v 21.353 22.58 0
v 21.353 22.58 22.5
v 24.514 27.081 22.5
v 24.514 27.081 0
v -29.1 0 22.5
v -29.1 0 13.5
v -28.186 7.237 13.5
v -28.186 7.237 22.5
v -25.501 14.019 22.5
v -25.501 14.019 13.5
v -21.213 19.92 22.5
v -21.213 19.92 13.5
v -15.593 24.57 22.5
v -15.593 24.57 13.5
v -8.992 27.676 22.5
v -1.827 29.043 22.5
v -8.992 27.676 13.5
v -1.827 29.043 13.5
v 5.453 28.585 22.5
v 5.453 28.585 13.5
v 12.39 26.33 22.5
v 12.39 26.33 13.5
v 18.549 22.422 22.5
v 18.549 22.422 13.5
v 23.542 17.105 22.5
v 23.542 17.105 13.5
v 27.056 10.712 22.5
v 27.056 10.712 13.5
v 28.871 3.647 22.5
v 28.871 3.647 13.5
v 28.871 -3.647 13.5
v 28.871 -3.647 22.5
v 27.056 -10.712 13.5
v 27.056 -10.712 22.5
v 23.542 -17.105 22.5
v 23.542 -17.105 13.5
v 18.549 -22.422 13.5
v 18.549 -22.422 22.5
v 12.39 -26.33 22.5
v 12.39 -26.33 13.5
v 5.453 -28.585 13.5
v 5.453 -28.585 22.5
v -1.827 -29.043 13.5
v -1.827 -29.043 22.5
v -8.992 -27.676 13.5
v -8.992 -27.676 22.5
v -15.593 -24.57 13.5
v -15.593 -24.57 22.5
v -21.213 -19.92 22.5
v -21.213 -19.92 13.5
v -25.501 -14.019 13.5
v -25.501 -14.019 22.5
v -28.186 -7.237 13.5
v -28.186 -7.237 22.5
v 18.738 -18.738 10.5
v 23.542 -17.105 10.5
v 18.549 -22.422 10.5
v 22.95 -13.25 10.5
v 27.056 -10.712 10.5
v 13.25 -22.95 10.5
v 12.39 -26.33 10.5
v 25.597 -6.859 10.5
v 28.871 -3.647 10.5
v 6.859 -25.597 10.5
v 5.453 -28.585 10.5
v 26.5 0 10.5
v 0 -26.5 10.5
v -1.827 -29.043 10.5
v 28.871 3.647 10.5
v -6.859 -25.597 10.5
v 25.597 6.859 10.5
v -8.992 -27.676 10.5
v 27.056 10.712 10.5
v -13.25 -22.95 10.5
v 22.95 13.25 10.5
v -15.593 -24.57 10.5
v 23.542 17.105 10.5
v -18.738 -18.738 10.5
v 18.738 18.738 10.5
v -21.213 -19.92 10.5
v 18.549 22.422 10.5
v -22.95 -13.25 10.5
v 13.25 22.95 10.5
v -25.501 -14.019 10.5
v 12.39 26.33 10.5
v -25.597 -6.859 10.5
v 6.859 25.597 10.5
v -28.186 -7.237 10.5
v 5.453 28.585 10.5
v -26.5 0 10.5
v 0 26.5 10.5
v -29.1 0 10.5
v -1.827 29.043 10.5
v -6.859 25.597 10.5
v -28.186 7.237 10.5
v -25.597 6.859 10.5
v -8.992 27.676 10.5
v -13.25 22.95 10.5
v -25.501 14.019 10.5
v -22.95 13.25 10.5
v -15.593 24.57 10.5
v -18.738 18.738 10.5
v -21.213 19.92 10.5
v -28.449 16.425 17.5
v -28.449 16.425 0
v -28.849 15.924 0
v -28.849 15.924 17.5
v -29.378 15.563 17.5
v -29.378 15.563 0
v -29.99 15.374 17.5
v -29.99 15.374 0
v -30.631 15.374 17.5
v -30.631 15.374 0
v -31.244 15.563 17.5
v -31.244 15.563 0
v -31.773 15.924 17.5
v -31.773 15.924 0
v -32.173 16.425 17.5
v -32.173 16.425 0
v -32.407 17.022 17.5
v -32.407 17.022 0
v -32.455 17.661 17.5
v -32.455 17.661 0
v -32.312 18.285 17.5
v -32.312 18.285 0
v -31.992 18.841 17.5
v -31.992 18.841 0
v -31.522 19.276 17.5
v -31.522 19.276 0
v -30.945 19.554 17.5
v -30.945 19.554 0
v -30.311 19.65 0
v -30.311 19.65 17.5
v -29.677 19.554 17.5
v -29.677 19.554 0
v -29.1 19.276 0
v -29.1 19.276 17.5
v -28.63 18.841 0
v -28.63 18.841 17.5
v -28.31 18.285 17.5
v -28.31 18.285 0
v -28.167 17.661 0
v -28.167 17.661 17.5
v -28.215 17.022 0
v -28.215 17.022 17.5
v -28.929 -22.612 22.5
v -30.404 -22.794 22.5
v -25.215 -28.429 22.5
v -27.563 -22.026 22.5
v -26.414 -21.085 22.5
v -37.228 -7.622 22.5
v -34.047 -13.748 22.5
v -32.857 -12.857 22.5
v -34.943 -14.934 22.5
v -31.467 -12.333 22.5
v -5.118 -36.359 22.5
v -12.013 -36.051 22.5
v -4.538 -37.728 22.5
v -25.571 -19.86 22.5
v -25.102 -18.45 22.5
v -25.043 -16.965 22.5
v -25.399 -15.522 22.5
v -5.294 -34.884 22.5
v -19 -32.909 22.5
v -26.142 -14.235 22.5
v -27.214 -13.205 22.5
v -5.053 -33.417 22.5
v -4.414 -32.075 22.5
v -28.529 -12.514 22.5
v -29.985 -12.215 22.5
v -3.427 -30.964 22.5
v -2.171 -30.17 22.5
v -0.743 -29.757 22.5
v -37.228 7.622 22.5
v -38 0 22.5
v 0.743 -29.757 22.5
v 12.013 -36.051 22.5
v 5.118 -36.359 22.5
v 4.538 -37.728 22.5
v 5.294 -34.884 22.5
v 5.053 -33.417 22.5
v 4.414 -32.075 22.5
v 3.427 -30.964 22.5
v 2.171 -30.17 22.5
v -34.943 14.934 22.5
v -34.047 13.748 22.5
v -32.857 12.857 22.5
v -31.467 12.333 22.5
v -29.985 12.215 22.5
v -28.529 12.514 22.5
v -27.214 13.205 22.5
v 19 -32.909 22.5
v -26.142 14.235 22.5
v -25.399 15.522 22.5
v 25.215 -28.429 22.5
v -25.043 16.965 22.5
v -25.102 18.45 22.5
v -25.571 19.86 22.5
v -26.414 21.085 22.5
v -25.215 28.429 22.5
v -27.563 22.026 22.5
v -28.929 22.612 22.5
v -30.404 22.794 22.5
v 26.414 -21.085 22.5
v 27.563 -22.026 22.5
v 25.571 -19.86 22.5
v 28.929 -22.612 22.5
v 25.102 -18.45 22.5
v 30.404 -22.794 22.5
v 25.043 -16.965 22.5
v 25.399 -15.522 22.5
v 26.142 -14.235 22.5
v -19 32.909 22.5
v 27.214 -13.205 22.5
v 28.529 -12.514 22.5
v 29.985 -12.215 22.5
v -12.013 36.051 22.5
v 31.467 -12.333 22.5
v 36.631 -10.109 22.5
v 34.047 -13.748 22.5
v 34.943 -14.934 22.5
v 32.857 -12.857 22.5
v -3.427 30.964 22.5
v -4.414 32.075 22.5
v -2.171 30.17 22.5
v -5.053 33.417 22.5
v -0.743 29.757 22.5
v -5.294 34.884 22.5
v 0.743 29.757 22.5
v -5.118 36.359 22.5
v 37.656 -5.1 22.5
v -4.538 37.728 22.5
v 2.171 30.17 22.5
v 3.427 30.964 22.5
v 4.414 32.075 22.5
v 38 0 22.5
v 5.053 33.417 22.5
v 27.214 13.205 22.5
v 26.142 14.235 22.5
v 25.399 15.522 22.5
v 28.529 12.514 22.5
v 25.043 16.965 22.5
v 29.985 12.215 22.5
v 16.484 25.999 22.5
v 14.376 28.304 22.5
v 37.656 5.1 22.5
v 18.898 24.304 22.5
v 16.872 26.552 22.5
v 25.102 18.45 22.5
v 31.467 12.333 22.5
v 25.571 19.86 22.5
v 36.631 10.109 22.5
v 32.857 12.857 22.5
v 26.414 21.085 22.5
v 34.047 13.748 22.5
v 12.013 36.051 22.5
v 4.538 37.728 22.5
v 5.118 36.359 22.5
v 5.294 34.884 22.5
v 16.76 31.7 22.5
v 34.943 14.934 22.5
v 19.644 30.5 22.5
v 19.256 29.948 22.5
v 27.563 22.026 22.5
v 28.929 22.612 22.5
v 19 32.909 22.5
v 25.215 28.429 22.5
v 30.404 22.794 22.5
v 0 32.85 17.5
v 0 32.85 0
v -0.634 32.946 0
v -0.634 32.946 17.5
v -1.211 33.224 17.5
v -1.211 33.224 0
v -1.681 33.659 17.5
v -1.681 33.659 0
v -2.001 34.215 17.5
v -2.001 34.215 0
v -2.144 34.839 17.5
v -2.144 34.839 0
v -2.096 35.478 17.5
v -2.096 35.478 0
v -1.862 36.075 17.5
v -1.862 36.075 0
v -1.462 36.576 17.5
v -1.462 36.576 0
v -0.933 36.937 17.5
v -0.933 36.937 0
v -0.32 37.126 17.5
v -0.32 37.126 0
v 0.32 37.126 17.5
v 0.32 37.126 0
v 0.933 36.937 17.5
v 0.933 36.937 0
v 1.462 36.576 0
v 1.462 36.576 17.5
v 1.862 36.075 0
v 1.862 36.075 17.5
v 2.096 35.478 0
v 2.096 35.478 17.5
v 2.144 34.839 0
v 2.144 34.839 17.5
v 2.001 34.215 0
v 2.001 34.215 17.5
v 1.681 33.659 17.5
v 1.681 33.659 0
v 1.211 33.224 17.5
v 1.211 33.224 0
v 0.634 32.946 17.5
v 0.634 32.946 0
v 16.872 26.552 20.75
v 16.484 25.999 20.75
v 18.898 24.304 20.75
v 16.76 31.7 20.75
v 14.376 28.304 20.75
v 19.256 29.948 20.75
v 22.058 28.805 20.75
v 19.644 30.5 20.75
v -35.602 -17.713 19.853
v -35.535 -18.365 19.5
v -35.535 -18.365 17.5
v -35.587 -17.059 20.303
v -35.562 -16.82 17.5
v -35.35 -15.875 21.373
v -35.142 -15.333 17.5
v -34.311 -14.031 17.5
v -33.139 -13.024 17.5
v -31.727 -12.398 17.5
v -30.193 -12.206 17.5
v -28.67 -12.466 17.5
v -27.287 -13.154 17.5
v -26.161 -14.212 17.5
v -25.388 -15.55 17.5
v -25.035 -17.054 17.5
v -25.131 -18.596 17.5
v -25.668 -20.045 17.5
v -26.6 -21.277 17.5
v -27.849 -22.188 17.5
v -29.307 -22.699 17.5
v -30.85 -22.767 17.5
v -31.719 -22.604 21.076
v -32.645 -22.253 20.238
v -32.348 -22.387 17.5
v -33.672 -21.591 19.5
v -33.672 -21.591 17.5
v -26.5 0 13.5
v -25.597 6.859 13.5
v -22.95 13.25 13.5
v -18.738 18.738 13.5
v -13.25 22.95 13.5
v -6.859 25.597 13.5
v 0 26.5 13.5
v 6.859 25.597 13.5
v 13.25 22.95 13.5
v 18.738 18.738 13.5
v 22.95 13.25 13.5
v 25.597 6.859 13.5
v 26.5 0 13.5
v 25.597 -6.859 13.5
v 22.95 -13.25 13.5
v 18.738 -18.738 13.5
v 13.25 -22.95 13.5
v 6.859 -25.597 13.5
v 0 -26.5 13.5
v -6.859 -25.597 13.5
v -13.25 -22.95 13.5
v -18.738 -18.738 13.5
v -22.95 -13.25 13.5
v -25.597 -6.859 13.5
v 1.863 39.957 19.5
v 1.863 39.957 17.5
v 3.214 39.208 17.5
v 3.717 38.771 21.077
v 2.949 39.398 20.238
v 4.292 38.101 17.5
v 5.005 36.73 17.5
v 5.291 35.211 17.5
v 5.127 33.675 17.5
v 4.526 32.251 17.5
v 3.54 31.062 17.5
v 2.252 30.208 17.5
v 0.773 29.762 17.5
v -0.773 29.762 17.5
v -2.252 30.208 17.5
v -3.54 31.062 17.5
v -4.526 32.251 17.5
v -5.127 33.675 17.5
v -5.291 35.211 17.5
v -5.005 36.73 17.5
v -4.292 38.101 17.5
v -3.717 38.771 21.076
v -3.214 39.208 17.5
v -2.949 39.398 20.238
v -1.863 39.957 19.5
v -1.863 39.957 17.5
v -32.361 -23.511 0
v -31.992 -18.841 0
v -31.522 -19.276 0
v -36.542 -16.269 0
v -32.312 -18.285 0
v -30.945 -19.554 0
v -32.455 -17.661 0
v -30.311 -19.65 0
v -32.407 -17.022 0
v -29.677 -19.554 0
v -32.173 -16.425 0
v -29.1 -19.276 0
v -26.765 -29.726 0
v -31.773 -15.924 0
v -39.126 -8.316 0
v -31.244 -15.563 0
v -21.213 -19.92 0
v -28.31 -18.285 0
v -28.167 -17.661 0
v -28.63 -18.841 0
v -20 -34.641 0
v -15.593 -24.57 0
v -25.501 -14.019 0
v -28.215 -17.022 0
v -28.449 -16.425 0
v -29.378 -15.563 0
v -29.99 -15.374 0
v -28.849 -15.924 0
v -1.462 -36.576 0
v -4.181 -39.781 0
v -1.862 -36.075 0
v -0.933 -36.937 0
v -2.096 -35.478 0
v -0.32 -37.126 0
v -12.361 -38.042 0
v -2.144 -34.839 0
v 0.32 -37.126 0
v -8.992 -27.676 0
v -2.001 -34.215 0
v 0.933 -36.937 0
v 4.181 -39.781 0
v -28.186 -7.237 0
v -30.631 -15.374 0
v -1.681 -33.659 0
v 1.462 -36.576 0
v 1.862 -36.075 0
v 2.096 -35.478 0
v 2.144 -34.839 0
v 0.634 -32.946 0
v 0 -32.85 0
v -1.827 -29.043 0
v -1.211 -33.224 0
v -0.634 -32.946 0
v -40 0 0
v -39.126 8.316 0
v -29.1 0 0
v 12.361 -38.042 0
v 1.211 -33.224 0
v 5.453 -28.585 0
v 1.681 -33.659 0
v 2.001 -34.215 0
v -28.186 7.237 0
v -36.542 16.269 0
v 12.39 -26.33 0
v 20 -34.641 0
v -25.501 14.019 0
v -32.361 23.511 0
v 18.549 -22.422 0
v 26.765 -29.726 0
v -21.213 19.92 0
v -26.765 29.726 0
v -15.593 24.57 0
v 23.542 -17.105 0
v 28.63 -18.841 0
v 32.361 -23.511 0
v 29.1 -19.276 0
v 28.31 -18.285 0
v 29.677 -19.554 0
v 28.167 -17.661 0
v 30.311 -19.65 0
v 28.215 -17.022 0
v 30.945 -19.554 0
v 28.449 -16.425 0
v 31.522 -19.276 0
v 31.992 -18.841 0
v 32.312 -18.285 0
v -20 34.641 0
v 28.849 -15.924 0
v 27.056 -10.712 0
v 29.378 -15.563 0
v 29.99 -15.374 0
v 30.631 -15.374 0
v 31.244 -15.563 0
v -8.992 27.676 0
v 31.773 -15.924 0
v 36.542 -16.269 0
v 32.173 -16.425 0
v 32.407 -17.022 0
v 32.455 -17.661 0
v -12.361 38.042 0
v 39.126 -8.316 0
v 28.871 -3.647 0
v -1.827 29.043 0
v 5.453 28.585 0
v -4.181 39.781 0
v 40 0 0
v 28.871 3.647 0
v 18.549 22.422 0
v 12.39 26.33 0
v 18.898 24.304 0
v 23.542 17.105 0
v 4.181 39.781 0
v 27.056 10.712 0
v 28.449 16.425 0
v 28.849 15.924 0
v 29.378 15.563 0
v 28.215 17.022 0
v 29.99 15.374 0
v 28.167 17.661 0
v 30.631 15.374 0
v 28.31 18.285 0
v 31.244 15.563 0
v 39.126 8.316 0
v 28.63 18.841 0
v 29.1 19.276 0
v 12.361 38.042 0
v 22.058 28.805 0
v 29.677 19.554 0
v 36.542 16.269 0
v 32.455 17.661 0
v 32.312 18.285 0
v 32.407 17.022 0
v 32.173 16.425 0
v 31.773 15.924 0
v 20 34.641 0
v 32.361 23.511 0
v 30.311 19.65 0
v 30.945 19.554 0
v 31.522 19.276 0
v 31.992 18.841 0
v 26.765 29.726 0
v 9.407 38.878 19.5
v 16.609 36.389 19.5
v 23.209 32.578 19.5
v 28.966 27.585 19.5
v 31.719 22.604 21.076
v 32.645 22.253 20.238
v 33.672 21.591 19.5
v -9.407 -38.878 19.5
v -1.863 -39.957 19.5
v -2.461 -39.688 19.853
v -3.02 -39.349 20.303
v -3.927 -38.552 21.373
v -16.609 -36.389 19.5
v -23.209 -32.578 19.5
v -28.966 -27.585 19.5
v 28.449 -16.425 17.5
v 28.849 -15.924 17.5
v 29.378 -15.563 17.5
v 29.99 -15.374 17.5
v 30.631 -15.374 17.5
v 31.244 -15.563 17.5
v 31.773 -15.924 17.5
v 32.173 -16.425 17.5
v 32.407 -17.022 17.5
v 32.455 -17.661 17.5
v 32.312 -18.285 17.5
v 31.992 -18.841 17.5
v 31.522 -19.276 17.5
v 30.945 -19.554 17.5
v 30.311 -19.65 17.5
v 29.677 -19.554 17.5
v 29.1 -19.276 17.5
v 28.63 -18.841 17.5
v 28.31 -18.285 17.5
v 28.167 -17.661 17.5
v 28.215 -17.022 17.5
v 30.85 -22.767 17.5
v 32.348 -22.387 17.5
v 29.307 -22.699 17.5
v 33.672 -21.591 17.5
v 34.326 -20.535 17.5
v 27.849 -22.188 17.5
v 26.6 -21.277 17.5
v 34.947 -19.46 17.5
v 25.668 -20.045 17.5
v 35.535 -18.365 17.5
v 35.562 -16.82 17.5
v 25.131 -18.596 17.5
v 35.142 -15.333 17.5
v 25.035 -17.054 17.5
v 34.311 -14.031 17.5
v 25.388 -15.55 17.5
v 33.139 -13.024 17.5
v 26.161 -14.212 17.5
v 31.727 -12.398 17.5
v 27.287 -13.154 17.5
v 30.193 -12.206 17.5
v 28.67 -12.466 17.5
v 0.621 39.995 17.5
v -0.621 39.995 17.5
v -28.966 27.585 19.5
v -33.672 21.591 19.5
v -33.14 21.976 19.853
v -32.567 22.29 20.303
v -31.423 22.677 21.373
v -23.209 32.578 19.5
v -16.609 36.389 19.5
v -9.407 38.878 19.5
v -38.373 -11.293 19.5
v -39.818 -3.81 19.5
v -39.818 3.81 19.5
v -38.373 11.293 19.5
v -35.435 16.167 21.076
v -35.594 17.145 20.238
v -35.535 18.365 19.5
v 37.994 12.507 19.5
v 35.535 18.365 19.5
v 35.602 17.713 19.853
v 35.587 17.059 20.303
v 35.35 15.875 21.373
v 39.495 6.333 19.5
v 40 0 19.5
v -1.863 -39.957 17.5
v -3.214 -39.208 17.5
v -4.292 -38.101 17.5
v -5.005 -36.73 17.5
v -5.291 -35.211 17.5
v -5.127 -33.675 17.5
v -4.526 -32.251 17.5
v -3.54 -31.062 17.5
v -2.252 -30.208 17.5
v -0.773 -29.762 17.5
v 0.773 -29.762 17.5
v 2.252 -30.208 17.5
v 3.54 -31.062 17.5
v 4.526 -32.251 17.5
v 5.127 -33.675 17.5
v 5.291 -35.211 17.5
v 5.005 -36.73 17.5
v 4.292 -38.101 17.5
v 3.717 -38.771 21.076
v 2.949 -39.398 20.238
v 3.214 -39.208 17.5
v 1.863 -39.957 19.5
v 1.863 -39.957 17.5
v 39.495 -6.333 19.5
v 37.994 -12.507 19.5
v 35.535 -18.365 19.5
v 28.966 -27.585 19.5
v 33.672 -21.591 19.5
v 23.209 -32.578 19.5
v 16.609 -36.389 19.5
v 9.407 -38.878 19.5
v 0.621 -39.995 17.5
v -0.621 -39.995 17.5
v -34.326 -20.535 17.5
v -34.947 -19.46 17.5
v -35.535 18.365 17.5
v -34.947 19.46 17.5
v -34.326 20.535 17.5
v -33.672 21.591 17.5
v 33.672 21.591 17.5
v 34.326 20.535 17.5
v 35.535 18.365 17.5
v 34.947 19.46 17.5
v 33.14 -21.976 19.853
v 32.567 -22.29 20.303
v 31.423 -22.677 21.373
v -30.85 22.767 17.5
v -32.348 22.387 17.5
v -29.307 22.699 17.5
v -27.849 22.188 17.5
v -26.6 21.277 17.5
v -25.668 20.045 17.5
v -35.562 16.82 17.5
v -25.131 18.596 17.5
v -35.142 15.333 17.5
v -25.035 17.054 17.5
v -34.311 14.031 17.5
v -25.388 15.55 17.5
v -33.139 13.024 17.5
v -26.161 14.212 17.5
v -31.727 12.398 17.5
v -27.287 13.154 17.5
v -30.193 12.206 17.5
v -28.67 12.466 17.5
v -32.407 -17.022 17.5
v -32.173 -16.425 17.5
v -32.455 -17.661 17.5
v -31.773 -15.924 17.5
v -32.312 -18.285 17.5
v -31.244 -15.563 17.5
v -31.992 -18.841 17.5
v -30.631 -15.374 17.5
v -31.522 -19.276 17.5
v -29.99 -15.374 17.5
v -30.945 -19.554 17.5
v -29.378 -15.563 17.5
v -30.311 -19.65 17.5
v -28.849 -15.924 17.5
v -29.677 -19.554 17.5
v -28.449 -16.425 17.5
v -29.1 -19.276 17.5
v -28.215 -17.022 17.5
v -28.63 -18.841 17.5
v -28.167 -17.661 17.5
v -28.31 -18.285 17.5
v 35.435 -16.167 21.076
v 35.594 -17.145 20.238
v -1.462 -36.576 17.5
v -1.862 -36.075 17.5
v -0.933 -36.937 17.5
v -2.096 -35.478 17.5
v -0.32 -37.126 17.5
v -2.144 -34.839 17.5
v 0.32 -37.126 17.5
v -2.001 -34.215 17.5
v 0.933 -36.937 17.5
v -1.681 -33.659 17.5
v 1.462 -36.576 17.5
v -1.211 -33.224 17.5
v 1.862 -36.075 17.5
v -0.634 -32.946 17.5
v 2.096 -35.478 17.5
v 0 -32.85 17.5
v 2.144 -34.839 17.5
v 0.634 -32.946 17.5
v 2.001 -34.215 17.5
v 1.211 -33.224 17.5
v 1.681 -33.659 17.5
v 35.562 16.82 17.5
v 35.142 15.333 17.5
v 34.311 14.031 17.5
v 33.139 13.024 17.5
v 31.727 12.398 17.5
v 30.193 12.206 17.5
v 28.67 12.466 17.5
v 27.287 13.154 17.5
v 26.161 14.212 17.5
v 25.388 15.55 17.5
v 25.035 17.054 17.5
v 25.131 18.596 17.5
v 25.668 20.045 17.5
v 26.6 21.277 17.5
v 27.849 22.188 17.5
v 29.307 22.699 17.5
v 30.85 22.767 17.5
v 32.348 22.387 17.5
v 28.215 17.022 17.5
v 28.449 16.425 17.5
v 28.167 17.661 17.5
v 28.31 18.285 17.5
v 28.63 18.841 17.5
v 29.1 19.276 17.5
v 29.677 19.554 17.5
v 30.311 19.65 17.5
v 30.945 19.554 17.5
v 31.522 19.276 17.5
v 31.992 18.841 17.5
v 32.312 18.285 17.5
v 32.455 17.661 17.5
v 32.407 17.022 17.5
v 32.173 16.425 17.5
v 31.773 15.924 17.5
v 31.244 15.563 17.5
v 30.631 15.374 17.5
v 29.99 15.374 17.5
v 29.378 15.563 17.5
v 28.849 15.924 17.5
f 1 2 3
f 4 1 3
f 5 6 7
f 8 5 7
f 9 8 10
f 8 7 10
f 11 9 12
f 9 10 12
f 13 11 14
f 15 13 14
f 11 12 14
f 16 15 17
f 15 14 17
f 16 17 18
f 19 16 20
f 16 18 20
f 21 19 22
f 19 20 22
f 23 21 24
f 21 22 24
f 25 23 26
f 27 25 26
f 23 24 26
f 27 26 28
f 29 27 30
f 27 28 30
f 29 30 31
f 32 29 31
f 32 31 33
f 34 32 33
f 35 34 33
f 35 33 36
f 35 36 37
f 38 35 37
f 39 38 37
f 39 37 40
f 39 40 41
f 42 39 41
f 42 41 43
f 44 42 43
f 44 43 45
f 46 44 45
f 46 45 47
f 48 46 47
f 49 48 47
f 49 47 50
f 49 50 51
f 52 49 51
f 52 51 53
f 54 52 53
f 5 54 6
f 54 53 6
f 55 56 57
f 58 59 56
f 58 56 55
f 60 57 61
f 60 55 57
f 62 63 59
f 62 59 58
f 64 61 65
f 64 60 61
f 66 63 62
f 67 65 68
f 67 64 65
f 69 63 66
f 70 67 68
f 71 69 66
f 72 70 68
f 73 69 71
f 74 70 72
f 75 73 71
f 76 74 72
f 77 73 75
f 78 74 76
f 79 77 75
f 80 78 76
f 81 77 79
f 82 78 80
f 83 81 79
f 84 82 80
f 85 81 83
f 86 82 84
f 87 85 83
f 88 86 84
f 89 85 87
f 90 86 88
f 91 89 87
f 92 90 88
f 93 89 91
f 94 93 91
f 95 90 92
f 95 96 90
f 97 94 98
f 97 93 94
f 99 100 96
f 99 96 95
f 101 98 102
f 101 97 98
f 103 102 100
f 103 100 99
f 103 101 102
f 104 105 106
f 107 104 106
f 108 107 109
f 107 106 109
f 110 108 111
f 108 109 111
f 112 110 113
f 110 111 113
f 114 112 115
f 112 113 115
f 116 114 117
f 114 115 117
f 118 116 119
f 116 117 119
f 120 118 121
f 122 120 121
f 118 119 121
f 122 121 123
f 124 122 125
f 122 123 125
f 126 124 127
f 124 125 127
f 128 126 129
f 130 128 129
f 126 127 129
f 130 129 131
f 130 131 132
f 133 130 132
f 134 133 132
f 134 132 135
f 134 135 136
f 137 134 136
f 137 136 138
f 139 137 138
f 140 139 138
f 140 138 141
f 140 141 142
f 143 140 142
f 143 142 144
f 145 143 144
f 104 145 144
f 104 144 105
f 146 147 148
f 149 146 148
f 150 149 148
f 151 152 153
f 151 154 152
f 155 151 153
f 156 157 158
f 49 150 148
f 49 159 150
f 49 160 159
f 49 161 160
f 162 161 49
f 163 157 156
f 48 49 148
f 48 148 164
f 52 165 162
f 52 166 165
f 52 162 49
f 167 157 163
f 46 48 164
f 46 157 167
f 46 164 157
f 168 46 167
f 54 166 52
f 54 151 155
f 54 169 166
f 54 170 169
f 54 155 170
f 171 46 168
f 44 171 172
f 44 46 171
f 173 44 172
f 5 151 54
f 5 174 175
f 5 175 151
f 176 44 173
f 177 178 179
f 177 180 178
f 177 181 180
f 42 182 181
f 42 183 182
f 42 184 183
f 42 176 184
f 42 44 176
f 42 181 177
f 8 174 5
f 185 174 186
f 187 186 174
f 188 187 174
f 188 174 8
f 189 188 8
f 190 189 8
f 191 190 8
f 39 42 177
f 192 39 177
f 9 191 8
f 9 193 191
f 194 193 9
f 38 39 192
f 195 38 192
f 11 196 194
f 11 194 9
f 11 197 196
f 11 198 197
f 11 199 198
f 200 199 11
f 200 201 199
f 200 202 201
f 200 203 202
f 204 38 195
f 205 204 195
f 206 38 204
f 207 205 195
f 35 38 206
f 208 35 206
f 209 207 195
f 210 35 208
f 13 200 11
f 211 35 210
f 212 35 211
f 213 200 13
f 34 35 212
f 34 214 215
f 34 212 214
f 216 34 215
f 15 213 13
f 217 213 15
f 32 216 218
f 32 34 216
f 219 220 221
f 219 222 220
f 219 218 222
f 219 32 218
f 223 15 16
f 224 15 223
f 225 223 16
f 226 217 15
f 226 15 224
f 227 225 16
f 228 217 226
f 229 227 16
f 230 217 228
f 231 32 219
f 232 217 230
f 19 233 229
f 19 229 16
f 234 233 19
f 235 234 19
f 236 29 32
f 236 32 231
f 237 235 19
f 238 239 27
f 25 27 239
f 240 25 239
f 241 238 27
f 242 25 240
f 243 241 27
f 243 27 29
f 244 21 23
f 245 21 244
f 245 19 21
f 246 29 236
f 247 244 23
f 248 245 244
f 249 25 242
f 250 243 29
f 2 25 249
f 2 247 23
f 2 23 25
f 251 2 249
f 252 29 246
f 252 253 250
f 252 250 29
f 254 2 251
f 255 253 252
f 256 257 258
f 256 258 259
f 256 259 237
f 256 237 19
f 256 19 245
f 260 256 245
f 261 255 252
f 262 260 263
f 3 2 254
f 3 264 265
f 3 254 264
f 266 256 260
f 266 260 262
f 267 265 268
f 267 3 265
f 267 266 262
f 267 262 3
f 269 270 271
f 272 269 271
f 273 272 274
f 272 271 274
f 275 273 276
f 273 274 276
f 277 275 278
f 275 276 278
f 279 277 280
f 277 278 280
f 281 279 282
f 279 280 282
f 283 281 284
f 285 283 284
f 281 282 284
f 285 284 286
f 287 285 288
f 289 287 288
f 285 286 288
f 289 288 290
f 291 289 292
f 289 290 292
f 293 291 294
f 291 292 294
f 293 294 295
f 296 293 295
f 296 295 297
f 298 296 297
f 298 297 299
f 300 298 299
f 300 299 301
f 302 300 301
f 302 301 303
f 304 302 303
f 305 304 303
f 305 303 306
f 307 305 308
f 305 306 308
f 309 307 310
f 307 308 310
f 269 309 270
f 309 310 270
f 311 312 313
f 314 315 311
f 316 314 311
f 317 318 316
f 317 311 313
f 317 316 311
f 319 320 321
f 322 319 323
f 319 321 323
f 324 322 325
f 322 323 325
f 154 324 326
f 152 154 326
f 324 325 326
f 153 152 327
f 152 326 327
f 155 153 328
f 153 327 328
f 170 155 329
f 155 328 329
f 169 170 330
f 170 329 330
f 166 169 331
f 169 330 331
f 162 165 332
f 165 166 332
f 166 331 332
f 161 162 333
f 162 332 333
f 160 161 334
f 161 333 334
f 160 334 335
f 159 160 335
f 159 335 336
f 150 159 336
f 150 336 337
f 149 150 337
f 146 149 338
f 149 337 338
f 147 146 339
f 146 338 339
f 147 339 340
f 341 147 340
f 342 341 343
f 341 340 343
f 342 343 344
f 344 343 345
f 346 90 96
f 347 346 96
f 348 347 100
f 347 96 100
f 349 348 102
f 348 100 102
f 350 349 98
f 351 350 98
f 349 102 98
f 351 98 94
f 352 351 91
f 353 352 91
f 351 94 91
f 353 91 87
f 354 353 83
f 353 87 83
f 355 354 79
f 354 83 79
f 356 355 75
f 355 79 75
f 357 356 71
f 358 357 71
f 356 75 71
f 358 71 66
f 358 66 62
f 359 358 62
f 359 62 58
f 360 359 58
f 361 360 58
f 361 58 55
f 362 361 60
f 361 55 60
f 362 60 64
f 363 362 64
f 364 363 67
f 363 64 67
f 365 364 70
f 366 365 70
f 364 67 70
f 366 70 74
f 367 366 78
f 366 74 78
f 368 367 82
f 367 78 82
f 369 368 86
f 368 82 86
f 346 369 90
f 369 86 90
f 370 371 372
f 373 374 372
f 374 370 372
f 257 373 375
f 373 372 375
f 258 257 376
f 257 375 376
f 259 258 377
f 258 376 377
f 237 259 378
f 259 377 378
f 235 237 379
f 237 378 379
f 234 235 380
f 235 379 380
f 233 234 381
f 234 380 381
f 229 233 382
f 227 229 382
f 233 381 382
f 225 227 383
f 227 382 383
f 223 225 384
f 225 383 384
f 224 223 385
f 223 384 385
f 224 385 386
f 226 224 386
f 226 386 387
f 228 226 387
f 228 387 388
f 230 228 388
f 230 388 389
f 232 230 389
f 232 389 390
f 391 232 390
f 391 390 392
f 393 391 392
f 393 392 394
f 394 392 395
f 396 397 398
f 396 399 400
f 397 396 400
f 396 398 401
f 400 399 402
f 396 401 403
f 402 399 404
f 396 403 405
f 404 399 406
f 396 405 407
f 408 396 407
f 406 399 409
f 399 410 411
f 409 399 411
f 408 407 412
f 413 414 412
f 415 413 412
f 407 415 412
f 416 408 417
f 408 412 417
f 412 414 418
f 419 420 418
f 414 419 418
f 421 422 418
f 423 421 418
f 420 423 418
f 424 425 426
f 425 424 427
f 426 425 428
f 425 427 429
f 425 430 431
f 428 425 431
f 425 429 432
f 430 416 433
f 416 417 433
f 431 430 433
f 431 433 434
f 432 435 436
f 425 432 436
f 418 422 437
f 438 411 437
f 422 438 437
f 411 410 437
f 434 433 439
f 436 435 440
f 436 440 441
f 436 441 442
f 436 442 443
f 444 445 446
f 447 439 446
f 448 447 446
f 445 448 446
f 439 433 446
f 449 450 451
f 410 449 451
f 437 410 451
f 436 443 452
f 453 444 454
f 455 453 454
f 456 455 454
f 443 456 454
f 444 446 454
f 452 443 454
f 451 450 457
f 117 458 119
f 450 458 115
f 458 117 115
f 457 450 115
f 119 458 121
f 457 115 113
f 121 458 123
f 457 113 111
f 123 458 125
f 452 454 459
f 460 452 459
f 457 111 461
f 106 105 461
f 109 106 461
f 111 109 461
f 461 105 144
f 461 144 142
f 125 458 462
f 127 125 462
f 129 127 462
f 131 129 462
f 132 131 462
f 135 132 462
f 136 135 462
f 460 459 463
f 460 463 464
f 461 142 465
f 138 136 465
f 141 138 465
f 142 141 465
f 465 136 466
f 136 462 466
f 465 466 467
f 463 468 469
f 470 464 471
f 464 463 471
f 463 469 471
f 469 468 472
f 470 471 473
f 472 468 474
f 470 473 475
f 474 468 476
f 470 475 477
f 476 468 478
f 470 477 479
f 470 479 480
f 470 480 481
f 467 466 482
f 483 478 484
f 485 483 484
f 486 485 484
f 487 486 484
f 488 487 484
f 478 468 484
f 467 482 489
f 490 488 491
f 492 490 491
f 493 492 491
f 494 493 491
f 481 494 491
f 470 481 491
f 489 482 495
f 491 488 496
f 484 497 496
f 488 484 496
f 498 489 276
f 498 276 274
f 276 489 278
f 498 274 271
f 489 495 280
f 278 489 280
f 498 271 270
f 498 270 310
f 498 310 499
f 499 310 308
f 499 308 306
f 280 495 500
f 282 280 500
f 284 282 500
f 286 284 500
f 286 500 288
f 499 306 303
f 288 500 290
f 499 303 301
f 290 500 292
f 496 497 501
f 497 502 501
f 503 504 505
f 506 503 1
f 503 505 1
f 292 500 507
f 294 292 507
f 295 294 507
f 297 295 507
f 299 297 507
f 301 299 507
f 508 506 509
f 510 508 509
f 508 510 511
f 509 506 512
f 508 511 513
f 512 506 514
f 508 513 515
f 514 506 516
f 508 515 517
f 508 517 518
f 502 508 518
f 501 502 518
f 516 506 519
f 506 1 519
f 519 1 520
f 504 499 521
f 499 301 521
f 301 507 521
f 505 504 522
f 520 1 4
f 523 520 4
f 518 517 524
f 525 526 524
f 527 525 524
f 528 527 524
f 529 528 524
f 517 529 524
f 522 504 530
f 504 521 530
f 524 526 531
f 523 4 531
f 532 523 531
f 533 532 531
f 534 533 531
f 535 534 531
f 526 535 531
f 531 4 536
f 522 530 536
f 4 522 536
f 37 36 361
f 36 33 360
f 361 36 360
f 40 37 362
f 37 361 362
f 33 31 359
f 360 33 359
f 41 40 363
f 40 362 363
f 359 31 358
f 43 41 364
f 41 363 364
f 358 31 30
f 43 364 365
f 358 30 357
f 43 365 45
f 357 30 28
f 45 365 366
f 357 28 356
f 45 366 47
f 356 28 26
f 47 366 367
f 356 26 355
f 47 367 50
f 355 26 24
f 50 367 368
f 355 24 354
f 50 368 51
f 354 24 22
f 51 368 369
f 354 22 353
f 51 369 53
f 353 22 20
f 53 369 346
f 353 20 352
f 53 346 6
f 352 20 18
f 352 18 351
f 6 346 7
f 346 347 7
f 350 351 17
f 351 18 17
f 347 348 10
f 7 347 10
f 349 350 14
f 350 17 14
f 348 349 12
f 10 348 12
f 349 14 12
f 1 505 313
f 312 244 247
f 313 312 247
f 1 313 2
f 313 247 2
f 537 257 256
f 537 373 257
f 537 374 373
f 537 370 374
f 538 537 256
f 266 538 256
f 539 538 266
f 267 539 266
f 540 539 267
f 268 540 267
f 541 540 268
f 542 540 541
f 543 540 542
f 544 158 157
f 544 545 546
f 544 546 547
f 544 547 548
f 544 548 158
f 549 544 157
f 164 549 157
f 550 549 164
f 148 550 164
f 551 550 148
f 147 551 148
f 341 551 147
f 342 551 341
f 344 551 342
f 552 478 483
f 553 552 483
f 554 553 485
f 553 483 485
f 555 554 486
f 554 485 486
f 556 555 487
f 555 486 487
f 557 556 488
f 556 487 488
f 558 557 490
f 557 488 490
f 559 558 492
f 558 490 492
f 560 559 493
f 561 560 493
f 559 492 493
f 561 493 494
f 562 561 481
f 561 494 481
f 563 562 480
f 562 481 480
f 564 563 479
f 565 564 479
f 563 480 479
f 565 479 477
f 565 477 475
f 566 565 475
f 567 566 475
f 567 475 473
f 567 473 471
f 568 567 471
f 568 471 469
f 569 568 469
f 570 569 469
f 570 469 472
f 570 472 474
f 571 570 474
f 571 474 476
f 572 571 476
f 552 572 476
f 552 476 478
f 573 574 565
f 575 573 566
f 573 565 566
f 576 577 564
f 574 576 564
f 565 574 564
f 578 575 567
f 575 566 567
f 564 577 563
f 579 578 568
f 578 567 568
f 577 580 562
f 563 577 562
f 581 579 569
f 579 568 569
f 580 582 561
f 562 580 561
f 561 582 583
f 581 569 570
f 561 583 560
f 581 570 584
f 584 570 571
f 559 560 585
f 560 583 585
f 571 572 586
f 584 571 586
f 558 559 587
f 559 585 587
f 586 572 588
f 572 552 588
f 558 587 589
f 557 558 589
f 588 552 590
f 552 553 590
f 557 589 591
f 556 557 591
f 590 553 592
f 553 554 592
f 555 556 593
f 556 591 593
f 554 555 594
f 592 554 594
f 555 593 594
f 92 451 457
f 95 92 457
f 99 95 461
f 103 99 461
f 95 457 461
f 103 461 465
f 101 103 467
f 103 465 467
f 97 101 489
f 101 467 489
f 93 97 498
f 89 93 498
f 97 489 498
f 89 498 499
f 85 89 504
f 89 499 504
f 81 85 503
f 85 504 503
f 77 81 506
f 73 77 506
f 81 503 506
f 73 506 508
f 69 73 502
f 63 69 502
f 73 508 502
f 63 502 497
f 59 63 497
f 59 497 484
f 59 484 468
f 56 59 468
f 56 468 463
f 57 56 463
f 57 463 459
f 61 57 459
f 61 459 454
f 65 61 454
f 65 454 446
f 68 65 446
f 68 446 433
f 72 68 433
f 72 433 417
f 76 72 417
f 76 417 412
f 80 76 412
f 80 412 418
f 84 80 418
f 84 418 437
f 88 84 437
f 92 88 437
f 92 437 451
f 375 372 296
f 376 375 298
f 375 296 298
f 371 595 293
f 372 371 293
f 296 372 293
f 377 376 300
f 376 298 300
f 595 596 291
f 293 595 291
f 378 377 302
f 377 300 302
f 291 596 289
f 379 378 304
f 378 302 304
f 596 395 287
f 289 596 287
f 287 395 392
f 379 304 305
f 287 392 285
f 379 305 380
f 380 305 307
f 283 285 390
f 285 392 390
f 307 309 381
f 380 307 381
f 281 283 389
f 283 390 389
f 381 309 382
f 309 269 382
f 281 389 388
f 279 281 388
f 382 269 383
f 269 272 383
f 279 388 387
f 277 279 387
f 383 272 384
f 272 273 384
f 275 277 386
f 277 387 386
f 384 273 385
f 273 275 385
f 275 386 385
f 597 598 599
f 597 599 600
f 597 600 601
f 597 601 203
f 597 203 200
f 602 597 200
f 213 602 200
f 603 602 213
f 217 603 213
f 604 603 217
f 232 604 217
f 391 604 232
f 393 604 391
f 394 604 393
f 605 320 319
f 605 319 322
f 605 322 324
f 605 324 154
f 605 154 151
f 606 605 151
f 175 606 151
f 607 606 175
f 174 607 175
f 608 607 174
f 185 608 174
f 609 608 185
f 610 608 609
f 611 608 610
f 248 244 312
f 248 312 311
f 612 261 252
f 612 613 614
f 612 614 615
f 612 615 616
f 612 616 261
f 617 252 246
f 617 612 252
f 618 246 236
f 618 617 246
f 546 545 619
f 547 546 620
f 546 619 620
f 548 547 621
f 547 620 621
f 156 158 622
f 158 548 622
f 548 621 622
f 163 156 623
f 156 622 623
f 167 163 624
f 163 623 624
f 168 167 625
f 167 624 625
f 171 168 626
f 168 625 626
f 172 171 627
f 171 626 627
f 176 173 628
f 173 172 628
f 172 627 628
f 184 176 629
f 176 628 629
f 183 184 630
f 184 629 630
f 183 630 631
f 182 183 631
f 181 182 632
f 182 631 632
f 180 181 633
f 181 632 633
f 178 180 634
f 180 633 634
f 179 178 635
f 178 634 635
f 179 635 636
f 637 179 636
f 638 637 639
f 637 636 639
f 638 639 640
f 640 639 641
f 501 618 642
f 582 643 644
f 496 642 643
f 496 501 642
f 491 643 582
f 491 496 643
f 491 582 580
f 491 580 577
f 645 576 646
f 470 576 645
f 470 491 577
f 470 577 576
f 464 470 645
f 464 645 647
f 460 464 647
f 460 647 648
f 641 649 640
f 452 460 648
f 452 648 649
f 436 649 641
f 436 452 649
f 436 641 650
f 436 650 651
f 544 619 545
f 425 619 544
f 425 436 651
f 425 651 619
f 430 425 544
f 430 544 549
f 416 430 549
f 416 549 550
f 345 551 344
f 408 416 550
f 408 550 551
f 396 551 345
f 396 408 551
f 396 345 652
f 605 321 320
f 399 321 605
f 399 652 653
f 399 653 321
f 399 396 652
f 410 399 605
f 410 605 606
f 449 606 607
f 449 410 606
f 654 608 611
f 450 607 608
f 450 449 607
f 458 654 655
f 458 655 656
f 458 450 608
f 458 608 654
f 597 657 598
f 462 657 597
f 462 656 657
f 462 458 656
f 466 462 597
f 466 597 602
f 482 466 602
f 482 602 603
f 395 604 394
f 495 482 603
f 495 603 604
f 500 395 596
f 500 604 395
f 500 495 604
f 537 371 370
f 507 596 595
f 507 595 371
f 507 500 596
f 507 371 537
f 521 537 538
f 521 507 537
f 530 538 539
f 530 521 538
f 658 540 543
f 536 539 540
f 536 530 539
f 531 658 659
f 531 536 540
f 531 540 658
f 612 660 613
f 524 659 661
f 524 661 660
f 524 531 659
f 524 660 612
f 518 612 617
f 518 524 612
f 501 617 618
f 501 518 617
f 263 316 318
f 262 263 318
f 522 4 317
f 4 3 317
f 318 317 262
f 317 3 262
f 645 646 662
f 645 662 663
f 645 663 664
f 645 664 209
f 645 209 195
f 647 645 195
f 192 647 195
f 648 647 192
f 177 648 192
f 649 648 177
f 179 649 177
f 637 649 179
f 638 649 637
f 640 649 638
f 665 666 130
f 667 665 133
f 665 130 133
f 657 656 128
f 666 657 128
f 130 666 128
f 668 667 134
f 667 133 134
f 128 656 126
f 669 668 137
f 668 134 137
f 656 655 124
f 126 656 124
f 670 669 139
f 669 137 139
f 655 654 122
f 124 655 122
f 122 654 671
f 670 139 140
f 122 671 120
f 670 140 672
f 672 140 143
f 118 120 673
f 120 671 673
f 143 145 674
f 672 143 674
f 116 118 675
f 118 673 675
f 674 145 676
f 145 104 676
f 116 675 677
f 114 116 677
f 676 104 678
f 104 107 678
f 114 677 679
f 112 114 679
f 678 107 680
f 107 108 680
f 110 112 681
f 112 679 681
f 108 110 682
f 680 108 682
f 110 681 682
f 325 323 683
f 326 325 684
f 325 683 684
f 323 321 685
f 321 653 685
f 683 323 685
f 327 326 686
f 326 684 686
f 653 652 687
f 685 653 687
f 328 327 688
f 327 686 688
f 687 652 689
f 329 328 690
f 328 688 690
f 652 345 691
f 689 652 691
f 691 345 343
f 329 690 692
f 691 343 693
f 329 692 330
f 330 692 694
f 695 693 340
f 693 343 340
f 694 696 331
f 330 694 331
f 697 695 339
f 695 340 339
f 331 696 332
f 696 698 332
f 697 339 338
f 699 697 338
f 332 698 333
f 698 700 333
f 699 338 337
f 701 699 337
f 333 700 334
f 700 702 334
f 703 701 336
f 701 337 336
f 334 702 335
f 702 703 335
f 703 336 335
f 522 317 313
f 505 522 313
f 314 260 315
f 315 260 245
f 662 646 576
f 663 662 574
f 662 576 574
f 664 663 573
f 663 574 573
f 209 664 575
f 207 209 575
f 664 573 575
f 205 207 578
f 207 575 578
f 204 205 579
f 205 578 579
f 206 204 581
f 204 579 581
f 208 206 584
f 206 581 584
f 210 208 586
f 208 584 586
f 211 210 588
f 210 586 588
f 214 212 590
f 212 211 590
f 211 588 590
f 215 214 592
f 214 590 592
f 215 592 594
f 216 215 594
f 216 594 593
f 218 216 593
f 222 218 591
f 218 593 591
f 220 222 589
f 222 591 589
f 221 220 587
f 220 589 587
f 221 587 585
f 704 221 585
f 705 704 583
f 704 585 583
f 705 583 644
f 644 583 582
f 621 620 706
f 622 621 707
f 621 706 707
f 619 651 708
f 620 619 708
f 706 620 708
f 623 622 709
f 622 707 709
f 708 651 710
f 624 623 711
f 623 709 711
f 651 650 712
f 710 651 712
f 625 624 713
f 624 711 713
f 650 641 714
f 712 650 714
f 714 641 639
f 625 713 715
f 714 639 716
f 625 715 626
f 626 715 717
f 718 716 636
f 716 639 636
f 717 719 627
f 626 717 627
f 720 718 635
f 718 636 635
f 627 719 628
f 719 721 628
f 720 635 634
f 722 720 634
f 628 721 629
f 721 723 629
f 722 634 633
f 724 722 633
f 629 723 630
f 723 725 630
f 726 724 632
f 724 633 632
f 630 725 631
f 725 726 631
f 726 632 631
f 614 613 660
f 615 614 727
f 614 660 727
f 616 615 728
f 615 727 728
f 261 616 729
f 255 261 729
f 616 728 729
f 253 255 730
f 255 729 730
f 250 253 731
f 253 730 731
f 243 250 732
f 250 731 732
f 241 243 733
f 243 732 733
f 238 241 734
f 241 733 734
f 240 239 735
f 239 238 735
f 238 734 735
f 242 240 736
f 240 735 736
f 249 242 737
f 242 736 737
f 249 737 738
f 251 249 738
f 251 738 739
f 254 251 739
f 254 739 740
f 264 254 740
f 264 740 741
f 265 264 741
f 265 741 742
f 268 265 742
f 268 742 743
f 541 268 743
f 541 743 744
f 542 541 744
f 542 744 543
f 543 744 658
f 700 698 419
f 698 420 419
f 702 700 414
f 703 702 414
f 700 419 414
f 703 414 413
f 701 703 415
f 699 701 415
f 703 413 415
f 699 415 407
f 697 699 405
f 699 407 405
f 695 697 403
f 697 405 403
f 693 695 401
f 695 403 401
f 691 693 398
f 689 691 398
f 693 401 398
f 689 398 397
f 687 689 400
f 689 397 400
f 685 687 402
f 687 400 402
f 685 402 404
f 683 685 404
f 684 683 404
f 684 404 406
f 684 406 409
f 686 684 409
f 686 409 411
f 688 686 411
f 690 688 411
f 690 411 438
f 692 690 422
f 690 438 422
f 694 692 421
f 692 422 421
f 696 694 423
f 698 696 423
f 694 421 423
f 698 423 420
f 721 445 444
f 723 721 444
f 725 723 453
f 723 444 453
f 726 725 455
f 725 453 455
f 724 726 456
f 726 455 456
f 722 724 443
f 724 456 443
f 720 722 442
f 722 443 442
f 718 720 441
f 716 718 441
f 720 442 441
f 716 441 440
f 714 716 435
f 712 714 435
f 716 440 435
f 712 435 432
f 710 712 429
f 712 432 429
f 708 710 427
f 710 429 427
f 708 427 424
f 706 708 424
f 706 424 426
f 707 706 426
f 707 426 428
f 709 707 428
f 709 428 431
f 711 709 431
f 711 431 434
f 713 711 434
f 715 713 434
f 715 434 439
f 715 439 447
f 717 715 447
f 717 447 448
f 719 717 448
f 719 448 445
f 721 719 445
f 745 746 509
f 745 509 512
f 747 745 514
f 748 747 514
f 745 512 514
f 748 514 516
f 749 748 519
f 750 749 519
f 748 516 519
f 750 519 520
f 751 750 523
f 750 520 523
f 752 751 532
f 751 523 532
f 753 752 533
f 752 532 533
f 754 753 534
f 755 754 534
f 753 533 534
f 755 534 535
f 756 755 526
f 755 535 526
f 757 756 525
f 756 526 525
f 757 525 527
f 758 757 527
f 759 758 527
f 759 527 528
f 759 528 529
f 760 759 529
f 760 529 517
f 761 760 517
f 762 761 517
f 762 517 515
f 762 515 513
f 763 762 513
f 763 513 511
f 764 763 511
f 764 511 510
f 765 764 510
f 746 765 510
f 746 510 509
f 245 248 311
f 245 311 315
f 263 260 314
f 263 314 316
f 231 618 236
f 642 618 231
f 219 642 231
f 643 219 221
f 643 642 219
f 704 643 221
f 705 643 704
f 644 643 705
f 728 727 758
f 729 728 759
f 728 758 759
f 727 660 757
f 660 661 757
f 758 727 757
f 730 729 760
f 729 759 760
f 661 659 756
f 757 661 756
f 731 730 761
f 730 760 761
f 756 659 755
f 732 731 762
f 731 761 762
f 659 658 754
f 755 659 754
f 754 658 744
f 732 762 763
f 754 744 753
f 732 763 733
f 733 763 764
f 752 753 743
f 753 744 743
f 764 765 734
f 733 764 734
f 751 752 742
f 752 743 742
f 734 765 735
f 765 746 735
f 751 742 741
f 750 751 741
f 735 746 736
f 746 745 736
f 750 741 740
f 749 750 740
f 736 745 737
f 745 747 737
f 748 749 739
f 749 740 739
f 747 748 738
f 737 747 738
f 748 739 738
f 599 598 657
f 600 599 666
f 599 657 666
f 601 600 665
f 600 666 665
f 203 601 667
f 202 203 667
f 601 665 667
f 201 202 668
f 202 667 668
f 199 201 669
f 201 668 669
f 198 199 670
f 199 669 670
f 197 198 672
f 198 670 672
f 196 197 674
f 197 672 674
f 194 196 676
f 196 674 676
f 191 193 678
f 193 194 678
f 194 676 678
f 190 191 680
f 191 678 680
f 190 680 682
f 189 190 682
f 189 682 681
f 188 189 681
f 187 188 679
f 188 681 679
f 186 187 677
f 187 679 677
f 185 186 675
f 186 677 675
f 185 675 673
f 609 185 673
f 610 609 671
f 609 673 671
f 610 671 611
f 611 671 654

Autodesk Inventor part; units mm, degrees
ref_plane "YZ Plane" through (0, 0, 0) normal (1, 0, 0) x (0, 1, 0)
ref_plane "XZ Plane" through (0, 0, 0) normal (0, 1, 0) x (-1, 0, 0)
ref_plane "XY Plane" through (0, 0, 0) normal (0, 0, 1) x (1, 0, 0)
sketch "Sketch1" plane through (0, 0, 0) normal (0, 0, 1) x (1, 0, 0)
  circle A0 centre (0, 0) radius 40
  dimension "d0" = 80
extrude "Extrusion1" add sketch "Sketch1" along normal blind 22.5
sketch "Sketch2" plane through (0, 0, 22.5) normal (0, 0, 1) x (1, 0, 0)
  point P0 (0, 0)
  point P1 (0, 35)
  dimension "d3" = 35
hole "Hole1" at (0, 35, 22.5) direction (0, 0, -1) diameter 4.3 end through all counterbore diameter 10.59 counterbore depth 5 clearance for "Hex Head Machine Screw" size "M4" standard "Ansi Metric M Profile"
chamfer "Chamfer1" distance 2 distance2 3 2 edges at (-27.6179, -28.9353, 22.5) (28.9353, 27.6179, 22.5) measured on face at (-2.7418, -16.4668, 22.5)
pattern_circular "Circular Pattern1" count 6 over 360 about axis through (0, 0, 0) along (0, 0, 1) of "Hole1"
sketch "Sketch3" plane through (0, 0, 0) normal (0, 0, -1) x (-1, 0, 0)
  circle A0 centre (0, 0) radius 29.1
  dimension "d17" = 58.2
extrude "Extrusion2" cut sketch "Sketch3" against normal through all
ref_plane "Work Plane1" through (0, 0, 10.5) normal (0, 0, -1) x (-1, 0, 0)
sketch "Sketch4" plane through (0, 0, 10.5) normal (0, 0, -1) x (-1, 0, 0)
  circle A0 centre (0, 0) radius 29.5
  circle A1 centre (0, 0) radius 26.5
  dimension "d21" = 53
  dimension "d22" = 59
extrude "Extrusion3" add sketch "Sketch4" against normal blind 3
sketch "Sketch5" plane through (0, 0, 22.5) normal (0, 0, 1) x (1, 0, 0)
  arc A0 (33.6722, 21.5913) -> (1.8625, 39.9566) centre (0, 0) ccw projected
  line L0 (0, 0) -> (40, 0) construction
  line L1 (21.3532, 22.5799) -> (24.5138, 27.0811)
  line L2 (24.5138, 27.0811) -> (17.1481, 32.253)
  line L3 (17.1481, 32.253) -> (13.9876, 27.7518)
  line L4 (13.9876, 27.7518) -> (21.3532, 22.5799)
  line L5 (21.3532, 22.5799) -> (17.1481, 32.253) construction
  line L6 (24.5138, 27.0811) -> (13.9876, 27.7518) construction
  line L7 (16.4837, 25.9991) -> (19.6443, 30.5003)
  line L8 (22.0585, 28.8051) -> (18.898, 24.3039)
  line L9 (14.3755, 28.3042) -> (16.7602, 31.7005)
  line L10 (16.7602, 31.7005) -> (19.2564, 29.9479)
  line L11 (19.2564, 29.9479) -> (16.8716, 26.5515)
  line L12 (16.8716, 26.5515) -> (14.3755, 28.3042)
  line L13 (19.2507, 27.4165) -> (15.5679, 30.0024)
  line L14 (16.8716, 26.5515) -> (16.7602, 31.7005)
  line L15 (14.3755, 28.3042) -> (19.2564, 29.9479)
  line L16 (0, 0) -> (16.8159, 29.126)
  line L17 (0, 0) -> (19.2507, 27.4165)
  point P0 (16.8716, 26.5515)
  dimension "d26" = 9
  dimension "d27" = 5.5
  dimension "d29" = 33.5
  dimension "d30" = 3.05
  dimension "d36" = 3
  dimension "d41" = 4.15
  dimension "d42" = 60
extrude "Extrusion4" cut sketch "Sketch5" against normal blind 1.75 contours L4 L17 L13 L7 L2 L8 | L4 L7 L13 L17 | L15 L14 L10 | L7 L13 L15 | L14 L13 L7 | L12 L16 L14 | L14 L13 L3 | L15 L3 L13 | L16 L12 L15
extrude "Extrusion7" cut sketch "Sketch5" against normal through all contours L4 L8 L2 L1
properties part number "Ring Cover Top"
